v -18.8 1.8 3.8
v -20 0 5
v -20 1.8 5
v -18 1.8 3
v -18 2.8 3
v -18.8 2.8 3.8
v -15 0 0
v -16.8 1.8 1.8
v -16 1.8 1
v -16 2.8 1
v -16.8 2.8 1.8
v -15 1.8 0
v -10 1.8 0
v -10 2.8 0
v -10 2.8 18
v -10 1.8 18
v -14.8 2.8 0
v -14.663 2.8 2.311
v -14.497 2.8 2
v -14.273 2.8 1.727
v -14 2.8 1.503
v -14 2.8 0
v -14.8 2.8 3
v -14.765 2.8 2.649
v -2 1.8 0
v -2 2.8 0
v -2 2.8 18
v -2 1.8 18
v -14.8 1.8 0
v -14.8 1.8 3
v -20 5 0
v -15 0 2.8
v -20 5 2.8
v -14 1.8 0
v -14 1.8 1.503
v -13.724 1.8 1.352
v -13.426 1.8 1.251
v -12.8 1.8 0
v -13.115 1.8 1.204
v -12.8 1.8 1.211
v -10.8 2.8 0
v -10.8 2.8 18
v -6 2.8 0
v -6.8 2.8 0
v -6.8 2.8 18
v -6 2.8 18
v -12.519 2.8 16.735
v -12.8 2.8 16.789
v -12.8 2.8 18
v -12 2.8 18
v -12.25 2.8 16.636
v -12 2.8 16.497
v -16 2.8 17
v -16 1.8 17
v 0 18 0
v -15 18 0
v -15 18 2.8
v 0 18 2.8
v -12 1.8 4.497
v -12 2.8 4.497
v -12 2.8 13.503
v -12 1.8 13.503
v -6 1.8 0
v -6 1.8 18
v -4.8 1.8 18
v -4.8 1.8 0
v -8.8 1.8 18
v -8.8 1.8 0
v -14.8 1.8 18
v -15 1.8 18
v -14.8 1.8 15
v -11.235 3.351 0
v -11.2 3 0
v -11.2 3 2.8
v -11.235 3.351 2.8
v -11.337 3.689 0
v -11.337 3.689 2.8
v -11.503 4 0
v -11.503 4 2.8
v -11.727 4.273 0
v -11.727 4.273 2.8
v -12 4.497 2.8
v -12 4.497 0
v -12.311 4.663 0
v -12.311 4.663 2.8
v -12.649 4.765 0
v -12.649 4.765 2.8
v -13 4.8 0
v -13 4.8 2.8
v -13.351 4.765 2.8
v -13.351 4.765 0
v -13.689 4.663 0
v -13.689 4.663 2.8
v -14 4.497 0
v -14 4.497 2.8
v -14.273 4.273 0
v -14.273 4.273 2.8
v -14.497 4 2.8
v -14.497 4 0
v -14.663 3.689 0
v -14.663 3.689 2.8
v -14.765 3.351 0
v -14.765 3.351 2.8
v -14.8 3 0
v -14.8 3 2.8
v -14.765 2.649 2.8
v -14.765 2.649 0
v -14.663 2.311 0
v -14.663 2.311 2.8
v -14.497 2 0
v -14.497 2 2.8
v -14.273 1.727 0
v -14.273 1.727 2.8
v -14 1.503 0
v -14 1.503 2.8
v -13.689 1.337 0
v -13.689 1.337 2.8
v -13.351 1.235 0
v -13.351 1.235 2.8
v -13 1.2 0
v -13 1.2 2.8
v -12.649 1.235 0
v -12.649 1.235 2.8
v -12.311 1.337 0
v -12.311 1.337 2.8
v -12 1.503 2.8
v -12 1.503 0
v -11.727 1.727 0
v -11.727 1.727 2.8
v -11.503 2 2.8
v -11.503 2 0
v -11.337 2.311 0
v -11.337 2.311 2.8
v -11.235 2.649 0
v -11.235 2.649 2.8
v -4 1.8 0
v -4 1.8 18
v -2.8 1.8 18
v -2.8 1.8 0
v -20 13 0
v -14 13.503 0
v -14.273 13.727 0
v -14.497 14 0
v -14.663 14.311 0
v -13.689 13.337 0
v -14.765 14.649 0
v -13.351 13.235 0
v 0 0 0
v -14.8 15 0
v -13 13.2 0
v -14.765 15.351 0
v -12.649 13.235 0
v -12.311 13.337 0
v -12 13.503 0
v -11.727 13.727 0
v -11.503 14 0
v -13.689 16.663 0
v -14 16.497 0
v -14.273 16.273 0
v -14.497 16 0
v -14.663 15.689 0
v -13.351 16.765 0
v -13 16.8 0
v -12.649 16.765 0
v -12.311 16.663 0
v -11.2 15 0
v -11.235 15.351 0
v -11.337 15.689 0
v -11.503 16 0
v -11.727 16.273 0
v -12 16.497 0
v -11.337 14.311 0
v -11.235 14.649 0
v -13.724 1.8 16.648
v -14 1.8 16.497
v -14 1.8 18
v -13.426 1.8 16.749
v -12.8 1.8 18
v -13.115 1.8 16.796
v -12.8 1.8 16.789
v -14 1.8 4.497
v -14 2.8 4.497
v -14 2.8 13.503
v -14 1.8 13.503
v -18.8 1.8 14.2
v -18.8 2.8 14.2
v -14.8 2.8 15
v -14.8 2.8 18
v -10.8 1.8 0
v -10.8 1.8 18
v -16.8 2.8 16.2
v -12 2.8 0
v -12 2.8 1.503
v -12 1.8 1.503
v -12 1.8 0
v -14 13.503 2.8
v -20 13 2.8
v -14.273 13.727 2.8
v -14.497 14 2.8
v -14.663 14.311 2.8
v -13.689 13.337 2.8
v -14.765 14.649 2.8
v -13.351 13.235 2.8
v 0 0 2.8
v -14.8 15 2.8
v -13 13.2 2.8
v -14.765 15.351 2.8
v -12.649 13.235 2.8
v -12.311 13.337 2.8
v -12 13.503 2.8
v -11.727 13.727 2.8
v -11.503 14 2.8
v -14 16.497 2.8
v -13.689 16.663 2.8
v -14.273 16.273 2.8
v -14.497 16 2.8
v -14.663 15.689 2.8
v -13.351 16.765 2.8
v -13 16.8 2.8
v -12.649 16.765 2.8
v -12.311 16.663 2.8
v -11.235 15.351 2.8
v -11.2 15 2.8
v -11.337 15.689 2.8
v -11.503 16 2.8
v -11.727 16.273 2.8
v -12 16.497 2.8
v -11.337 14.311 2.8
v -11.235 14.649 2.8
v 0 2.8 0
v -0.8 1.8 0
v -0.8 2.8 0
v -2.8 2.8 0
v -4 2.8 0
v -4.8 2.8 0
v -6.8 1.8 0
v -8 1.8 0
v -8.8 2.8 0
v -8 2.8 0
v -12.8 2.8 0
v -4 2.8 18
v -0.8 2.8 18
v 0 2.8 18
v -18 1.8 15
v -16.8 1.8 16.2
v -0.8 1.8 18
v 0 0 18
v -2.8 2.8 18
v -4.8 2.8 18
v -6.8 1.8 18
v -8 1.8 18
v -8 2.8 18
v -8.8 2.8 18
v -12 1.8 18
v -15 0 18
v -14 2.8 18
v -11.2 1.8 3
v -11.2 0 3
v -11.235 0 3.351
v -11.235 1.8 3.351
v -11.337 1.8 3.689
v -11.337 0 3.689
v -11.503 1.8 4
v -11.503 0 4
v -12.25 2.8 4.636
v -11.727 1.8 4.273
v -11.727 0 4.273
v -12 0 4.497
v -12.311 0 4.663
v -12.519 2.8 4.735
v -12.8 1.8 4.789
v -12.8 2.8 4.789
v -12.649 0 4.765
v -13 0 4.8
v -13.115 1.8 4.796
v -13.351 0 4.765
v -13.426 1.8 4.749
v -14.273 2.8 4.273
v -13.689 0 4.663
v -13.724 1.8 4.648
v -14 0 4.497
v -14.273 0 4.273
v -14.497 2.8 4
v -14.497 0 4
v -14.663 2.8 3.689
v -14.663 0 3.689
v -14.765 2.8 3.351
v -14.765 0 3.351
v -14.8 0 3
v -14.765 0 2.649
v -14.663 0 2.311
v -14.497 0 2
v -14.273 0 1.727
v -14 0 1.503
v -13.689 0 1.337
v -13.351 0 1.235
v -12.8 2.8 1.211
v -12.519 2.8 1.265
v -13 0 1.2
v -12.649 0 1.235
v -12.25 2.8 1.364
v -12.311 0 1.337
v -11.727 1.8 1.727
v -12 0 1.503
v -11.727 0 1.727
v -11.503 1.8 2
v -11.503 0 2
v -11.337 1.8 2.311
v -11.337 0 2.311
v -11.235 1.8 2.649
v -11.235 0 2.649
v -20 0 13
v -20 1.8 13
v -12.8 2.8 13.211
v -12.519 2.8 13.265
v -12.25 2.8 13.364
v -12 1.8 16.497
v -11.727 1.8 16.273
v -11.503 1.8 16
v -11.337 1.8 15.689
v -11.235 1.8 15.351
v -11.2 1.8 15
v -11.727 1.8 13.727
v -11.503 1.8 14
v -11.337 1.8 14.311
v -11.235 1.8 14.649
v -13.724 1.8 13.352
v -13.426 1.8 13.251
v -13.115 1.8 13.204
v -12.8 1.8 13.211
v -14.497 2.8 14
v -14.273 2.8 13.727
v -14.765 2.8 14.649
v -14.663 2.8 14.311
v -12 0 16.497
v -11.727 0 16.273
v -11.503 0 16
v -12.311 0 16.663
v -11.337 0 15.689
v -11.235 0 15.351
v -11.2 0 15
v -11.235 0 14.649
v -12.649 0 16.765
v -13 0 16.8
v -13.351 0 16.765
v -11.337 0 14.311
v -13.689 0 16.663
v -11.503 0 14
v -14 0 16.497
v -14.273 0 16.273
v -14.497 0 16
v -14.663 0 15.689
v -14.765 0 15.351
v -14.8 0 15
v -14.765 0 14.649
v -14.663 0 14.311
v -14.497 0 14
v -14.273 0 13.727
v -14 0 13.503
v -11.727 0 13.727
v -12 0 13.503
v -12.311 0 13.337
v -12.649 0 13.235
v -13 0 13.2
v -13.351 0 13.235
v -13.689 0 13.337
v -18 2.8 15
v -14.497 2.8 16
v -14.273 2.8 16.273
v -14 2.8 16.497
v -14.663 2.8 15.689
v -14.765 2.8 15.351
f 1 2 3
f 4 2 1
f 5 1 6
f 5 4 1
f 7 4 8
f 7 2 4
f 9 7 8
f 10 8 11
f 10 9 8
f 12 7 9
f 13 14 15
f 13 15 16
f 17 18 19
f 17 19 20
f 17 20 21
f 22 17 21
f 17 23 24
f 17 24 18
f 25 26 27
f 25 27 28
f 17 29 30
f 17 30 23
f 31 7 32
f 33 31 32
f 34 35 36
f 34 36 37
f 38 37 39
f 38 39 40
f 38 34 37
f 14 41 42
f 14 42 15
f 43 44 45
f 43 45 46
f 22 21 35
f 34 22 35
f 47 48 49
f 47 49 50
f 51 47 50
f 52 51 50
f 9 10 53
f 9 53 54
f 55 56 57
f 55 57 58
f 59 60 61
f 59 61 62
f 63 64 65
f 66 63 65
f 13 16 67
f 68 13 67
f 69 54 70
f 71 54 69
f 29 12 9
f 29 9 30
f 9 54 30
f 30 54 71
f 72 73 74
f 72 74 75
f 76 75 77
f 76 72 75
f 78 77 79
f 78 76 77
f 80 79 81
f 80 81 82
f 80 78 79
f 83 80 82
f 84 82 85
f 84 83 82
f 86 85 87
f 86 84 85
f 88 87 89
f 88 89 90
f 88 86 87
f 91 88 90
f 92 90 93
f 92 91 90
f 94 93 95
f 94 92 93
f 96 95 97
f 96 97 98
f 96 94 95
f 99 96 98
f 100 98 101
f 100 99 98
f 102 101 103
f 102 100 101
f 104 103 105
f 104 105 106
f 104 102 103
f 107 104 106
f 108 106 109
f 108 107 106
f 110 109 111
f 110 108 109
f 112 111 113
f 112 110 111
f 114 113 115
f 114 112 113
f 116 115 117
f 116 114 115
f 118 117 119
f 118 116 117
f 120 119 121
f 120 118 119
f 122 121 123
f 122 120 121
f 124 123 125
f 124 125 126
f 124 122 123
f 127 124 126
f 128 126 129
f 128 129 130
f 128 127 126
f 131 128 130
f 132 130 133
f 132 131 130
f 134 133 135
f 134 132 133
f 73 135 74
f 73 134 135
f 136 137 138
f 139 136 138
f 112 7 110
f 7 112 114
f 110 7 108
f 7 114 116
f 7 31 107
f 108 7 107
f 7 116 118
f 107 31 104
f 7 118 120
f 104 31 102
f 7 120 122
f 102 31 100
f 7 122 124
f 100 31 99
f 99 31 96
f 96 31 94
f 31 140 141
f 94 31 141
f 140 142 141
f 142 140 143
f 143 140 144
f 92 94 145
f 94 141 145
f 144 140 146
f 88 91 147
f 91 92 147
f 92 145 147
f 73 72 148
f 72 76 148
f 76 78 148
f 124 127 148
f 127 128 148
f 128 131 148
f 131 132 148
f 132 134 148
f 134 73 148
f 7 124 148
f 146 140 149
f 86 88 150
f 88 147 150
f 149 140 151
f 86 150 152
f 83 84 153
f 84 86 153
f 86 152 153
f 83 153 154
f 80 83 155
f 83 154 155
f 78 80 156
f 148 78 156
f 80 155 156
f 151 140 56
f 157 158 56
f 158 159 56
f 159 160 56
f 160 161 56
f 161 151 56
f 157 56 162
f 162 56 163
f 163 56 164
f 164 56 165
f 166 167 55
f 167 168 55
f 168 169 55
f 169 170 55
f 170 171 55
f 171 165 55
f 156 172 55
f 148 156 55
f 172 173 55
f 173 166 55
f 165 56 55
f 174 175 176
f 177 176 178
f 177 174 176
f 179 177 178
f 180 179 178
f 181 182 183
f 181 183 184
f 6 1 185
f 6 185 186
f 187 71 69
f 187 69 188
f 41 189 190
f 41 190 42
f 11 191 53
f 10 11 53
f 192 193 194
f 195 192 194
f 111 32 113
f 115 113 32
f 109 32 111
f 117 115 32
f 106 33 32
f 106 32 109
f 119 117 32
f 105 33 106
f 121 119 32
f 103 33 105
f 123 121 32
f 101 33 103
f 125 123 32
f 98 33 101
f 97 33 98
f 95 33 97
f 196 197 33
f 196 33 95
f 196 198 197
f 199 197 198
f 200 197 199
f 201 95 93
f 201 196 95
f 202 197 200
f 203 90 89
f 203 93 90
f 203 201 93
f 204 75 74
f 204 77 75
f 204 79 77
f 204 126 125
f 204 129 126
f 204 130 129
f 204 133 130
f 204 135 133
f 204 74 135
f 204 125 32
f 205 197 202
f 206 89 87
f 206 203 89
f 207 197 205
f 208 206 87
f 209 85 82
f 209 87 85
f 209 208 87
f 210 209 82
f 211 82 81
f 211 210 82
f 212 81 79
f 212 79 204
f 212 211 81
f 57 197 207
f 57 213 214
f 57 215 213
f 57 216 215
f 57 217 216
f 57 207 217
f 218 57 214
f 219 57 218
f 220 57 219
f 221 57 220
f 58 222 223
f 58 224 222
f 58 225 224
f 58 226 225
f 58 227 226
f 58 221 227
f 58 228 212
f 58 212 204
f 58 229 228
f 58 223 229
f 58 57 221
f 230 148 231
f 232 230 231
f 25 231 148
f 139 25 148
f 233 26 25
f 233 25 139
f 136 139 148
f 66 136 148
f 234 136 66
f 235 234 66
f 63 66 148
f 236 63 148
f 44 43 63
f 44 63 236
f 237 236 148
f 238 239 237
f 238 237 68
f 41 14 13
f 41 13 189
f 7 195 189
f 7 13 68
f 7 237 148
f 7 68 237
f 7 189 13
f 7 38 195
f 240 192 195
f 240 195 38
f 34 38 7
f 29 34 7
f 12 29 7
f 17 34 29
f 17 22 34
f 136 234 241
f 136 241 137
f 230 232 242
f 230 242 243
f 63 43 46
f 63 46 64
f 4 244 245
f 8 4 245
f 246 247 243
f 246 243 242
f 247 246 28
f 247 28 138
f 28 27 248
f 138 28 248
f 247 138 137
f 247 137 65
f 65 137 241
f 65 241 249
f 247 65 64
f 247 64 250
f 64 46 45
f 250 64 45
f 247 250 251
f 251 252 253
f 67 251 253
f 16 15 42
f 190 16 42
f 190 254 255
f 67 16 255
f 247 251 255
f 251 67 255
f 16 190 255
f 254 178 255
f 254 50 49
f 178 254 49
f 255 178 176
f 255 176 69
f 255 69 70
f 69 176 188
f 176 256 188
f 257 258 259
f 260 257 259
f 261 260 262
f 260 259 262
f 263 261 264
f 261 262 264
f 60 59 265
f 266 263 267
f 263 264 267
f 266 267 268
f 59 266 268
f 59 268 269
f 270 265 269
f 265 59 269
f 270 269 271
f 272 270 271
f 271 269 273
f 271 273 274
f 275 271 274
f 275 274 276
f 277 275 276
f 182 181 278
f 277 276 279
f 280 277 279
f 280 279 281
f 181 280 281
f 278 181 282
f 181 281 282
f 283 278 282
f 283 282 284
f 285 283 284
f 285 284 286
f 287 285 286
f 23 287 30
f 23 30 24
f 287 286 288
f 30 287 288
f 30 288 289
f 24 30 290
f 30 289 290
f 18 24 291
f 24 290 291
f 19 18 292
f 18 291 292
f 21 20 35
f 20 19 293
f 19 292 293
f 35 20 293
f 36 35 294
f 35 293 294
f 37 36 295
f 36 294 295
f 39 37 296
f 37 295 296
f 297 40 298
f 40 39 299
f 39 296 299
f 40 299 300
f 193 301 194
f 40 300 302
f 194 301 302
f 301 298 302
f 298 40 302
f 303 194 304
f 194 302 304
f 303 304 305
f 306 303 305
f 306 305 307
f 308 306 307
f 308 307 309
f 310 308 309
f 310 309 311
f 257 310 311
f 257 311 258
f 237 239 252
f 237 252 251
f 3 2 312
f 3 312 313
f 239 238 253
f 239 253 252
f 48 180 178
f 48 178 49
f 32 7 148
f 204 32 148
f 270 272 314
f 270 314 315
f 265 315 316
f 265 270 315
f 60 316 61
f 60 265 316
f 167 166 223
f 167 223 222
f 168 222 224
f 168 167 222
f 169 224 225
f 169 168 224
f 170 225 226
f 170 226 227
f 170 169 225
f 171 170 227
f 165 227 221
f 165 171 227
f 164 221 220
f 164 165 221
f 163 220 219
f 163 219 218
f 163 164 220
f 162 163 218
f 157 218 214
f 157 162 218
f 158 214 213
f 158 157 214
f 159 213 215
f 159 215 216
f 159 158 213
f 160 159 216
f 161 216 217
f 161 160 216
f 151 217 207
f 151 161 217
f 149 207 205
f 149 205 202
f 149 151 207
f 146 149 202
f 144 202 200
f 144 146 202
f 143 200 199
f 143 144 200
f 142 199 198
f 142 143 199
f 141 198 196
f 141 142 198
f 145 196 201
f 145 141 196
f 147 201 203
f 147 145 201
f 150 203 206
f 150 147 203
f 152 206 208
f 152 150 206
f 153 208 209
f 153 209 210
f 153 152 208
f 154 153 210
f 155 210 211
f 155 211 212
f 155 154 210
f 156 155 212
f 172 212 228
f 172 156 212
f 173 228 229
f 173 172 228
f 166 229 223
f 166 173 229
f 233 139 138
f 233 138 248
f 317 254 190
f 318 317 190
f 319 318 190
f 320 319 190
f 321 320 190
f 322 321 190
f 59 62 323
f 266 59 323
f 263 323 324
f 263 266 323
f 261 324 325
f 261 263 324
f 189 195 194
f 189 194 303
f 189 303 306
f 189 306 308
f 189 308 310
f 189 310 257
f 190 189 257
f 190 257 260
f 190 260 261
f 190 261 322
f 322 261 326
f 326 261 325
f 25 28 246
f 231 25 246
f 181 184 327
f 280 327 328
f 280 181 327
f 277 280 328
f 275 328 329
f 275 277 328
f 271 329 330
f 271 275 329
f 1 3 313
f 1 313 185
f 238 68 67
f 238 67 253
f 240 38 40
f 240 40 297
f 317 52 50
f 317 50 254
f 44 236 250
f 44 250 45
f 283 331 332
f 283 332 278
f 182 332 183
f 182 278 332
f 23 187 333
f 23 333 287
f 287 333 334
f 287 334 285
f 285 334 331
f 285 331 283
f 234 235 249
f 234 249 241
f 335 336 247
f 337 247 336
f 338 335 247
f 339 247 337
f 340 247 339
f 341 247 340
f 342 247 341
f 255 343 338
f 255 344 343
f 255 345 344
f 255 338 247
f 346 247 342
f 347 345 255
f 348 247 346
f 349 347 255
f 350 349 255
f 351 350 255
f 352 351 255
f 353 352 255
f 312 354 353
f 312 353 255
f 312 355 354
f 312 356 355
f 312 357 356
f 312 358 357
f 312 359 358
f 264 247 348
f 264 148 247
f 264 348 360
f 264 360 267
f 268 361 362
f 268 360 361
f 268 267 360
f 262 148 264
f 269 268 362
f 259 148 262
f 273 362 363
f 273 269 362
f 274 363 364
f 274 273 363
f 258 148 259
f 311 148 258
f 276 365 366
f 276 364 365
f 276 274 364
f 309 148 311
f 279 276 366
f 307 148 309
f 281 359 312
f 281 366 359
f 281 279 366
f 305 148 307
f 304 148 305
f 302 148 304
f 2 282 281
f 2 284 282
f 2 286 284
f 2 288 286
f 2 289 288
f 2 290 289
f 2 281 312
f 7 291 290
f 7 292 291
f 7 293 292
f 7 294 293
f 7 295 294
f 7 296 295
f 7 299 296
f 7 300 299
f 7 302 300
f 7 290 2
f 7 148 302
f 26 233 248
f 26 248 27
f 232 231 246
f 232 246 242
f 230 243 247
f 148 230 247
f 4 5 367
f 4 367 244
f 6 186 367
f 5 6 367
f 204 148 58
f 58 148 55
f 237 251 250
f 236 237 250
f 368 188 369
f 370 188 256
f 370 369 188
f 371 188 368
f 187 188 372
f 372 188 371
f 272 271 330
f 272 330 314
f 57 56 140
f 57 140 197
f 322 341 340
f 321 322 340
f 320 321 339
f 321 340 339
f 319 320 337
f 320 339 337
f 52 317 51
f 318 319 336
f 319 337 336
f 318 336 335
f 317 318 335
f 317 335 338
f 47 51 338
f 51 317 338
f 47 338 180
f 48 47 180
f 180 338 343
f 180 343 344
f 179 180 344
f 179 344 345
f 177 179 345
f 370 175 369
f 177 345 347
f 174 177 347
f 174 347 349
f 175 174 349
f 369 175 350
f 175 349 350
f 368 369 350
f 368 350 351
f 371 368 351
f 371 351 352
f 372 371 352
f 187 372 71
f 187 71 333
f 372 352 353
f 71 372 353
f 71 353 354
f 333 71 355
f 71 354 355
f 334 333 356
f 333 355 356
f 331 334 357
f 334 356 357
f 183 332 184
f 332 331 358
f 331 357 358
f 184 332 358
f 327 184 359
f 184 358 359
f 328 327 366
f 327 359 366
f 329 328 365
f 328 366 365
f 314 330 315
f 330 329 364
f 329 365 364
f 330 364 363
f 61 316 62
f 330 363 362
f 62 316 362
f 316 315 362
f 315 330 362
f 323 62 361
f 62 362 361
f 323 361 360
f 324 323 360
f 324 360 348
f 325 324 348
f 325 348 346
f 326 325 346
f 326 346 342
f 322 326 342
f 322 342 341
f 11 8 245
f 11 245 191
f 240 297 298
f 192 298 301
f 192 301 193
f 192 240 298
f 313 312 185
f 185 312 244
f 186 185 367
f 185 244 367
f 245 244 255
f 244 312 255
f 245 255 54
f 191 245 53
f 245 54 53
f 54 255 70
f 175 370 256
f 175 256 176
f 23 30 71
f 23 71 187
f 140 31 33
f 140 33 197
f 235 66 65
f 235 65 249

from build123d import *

# Parameters (mm, degrees)
PAD_DEPTH       = 18
SKETCH001_R     = 1.8
POCKET_DEPTH    = 5
CHAMFER_SIZE    = 5
SKETCH002_W     = 20
SKETCH002_H     = 18
SKETCH002_R     = 1.8
PAD001_DEPTH    = 2.8
CHAMFER001_SIZE = 5


with BuildPart() as chamfer_body:
    # Sketch → Pad (new body)
    with BuildSketch(Plane.XY):
        Polygon((-20, 1.8), (-18.8, 1.8), (-18.8, 2.8), (-18, 2.8), (-18, 1.8), (-16.8, 1.8), (-16.8, 2.8), (-16, 2.8), (-16, 1.8), (-14.8, 1.8), (-14.8, 2.8), (-14, 2.8), (-14, 1.8), (-12.8, 1.8), (-12.8, 2.8), (-12, 2.8), (-12, 1.8), (-10.8, 1.8), (-10.8, 2.8), (-10, 2.8), (-10, 1.8), (-8.8, 1.8), (-8.8, 2.8), (-8, 2.8), (-8, 1.8), (-6.8, 1.8), (-6.8, 2.8), (-6, 2.8), (-6, 1.8), (-4.8, 1.8), (-4.8, 2.8), (-4, 2.8), (-4, 1.8), (-2.8, 1.8), (-2.8, 2.8), (-2, 2.8), (-2, 1.8), (-0.8, 1.8), (-0.8, 2.8), (0, 2.8), (0, 0), (-20, 0), align=None)
    extrude(amount=PAD_DEPTH)

    # Sketch001 → Pocket (cut)
    with BuildSketch(Plane.XZ):
        with Locations((-13, 15)):
            Circle(SKETCH001_R)
        with Locations((-13, 3)):
            Circle(SKETCH001_R)
    extrude(amount=-POCKET_DEPTH, mode=Mode.SUBTRACT)

    # Chamfer
    chamfer_edges = [chamfer_body.edges().sort_by_distance(p)[0] for p in [
        (-20, 0.9, 18),
        (-20, 0.9, 0),
    ]]
    chamfer(chamfer_edges, length=CHAMFER_SIZE)


with BuildPart() as chamfer001:
    # Sketch002 → Pad001 (new body)
    with BuildSketch(Plane.XY):
        with Locations((-10, 9)):
            Rectangle(SKETCH002_W, SKETCH002_H)
        with Locations((-13, 15)):
            Circle(SKETCH002_R, mode=Mode.SUBTRACT)
        with Locations((-13, 3)):
            Circle(SKETCH002_R, mode=Mode.SUBTRACT)
    extrude(amount=PAD001_DEPTH)

    # Chamfer001
    chamfer001_edges = [chamfer001.edges().sort_by_distance(p)[0] for p in [
        (-20, 18, 1.4),
        (-20, 0, 1.4),
    ]]
    chamfer(chamfer001_edges, length=CHAMFER001_SIZE)


solid = Compound([chamfer_body.part, chamfer001.part])
